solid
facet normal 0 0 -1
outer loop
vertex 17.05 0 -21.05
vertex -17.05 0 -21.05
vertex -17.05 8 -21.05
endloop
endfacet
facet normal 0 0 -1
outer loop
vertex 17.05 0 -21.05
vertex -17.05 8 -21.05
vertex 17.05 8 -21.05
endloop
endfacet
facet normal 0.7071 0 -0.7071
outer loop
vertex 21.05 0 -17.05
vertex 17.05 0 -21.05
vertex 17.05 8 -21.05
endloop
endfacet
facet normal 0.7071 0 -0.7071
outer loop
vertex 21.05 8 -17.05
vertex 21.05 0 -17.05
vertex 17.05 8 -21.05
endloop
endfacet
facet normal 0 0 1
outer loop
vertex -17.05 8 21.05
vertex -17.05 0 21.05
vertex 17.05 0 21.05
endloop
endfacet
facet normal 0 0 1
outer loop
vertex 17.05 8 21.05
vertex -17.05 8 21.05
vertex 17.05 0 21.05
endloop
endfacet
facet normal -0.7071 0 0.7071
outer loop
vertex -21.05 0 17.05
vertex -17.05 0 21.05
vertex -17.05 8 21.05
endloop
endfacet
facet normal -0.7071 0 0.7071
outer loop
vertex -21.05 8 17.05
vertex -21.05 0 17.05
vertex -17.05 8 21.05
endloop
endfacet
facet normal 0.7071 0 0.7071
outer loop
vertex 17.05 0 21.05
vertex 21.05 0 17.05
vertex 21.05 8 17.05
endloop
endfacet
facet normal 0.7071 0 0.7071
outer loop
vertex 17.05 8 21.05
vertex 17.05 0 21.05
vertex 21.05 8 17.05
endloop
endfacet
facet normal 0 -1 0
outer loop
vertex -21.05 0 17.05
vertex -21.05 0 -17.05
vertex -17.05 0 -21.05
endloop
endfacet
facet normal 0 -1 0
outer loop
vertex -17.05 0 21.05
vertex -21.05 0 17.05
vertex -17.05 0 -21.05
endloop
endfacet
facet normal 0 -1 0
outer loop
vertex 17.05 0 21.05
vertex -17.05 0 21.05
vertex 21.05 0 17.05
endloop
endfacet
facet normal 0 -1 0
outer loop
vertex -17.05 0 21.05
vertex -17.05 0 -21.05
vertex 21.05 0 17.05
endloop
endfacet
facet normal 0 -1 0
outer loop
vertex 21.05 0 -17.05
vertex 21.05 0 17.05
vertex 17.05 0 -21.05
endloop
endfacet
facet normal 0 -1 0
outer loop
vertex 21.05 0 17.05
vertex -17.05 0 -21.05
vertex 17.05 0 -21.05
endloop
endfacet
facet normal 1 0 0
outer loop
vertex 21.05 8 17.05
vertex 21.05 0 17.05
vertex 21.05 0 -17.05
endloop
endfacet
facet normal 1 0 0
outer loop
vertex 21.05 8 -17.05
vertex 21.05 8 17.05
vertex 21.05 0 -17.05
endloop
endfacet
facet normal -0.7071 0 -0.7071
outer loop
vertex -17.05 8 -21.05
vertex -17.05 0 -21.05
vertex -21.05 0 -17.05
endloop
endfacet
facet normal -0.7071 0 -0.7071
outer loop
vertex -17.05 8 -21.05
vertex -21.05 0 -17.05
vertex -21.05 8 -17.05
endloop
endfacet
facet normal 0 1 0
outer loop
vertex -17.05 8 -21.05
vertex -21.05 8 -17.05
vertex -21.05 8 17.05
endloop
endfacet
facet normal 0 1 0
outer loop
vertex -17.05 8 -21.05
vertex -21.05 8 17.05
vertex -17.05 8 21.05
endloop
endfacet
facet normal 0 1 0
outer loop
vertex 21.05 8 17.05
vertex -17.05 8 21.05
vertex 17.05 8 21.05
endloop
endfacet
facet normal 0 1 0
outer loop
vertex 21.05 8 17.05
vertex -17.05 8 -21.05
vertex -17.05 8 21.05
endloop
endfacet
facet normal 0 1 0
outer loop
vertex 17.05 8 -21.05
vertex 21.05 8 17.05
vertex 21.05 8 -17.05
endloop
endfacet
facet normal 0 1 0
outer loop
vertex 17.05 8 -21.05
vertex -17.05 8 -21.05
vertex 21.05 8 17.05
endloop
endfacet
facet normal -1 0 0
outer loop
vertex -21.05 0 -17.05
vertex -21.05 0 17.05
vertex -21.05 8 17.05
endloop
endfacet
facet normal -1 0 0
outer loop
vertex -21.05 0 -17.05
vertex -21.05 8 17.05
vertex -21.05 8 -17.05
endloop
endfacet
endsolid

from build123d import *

# Parameters (mm, degrees)
SKETCH2_W           = 42.1
SKETCH2_H           = 42.1
BOSS_EXTRUDE1_DEPTH = 8
CHAMFER3_SIZE       = 4


with BuildPart() as part:
    # Sketch2 → Boss-Extrude1 (new body)
    with BuildSketch(Plane(origin=(0, 0, 0), x_dir=(1, 0, 0), z_dir=(0, 1, 0))):
        Rectangle(SKETCH2_W, SKETCH2_H)
    extrude(amount=BOSS_EXTRUDE1_DEPTH)

    # Chamfer3
    chamfer3_edges = [part.edges().sort_by_distance(p)[0] for p in [
        (21.05, 4, 21.05),
        (-21.05, 4, 21.05),
        (-21.05, 4, -21.05),
        (21.05, 4, -21.05),
    ]]
    chamfer(chamfer3_edges, length=CHAMFER3_SIZE)


solid = part.part
